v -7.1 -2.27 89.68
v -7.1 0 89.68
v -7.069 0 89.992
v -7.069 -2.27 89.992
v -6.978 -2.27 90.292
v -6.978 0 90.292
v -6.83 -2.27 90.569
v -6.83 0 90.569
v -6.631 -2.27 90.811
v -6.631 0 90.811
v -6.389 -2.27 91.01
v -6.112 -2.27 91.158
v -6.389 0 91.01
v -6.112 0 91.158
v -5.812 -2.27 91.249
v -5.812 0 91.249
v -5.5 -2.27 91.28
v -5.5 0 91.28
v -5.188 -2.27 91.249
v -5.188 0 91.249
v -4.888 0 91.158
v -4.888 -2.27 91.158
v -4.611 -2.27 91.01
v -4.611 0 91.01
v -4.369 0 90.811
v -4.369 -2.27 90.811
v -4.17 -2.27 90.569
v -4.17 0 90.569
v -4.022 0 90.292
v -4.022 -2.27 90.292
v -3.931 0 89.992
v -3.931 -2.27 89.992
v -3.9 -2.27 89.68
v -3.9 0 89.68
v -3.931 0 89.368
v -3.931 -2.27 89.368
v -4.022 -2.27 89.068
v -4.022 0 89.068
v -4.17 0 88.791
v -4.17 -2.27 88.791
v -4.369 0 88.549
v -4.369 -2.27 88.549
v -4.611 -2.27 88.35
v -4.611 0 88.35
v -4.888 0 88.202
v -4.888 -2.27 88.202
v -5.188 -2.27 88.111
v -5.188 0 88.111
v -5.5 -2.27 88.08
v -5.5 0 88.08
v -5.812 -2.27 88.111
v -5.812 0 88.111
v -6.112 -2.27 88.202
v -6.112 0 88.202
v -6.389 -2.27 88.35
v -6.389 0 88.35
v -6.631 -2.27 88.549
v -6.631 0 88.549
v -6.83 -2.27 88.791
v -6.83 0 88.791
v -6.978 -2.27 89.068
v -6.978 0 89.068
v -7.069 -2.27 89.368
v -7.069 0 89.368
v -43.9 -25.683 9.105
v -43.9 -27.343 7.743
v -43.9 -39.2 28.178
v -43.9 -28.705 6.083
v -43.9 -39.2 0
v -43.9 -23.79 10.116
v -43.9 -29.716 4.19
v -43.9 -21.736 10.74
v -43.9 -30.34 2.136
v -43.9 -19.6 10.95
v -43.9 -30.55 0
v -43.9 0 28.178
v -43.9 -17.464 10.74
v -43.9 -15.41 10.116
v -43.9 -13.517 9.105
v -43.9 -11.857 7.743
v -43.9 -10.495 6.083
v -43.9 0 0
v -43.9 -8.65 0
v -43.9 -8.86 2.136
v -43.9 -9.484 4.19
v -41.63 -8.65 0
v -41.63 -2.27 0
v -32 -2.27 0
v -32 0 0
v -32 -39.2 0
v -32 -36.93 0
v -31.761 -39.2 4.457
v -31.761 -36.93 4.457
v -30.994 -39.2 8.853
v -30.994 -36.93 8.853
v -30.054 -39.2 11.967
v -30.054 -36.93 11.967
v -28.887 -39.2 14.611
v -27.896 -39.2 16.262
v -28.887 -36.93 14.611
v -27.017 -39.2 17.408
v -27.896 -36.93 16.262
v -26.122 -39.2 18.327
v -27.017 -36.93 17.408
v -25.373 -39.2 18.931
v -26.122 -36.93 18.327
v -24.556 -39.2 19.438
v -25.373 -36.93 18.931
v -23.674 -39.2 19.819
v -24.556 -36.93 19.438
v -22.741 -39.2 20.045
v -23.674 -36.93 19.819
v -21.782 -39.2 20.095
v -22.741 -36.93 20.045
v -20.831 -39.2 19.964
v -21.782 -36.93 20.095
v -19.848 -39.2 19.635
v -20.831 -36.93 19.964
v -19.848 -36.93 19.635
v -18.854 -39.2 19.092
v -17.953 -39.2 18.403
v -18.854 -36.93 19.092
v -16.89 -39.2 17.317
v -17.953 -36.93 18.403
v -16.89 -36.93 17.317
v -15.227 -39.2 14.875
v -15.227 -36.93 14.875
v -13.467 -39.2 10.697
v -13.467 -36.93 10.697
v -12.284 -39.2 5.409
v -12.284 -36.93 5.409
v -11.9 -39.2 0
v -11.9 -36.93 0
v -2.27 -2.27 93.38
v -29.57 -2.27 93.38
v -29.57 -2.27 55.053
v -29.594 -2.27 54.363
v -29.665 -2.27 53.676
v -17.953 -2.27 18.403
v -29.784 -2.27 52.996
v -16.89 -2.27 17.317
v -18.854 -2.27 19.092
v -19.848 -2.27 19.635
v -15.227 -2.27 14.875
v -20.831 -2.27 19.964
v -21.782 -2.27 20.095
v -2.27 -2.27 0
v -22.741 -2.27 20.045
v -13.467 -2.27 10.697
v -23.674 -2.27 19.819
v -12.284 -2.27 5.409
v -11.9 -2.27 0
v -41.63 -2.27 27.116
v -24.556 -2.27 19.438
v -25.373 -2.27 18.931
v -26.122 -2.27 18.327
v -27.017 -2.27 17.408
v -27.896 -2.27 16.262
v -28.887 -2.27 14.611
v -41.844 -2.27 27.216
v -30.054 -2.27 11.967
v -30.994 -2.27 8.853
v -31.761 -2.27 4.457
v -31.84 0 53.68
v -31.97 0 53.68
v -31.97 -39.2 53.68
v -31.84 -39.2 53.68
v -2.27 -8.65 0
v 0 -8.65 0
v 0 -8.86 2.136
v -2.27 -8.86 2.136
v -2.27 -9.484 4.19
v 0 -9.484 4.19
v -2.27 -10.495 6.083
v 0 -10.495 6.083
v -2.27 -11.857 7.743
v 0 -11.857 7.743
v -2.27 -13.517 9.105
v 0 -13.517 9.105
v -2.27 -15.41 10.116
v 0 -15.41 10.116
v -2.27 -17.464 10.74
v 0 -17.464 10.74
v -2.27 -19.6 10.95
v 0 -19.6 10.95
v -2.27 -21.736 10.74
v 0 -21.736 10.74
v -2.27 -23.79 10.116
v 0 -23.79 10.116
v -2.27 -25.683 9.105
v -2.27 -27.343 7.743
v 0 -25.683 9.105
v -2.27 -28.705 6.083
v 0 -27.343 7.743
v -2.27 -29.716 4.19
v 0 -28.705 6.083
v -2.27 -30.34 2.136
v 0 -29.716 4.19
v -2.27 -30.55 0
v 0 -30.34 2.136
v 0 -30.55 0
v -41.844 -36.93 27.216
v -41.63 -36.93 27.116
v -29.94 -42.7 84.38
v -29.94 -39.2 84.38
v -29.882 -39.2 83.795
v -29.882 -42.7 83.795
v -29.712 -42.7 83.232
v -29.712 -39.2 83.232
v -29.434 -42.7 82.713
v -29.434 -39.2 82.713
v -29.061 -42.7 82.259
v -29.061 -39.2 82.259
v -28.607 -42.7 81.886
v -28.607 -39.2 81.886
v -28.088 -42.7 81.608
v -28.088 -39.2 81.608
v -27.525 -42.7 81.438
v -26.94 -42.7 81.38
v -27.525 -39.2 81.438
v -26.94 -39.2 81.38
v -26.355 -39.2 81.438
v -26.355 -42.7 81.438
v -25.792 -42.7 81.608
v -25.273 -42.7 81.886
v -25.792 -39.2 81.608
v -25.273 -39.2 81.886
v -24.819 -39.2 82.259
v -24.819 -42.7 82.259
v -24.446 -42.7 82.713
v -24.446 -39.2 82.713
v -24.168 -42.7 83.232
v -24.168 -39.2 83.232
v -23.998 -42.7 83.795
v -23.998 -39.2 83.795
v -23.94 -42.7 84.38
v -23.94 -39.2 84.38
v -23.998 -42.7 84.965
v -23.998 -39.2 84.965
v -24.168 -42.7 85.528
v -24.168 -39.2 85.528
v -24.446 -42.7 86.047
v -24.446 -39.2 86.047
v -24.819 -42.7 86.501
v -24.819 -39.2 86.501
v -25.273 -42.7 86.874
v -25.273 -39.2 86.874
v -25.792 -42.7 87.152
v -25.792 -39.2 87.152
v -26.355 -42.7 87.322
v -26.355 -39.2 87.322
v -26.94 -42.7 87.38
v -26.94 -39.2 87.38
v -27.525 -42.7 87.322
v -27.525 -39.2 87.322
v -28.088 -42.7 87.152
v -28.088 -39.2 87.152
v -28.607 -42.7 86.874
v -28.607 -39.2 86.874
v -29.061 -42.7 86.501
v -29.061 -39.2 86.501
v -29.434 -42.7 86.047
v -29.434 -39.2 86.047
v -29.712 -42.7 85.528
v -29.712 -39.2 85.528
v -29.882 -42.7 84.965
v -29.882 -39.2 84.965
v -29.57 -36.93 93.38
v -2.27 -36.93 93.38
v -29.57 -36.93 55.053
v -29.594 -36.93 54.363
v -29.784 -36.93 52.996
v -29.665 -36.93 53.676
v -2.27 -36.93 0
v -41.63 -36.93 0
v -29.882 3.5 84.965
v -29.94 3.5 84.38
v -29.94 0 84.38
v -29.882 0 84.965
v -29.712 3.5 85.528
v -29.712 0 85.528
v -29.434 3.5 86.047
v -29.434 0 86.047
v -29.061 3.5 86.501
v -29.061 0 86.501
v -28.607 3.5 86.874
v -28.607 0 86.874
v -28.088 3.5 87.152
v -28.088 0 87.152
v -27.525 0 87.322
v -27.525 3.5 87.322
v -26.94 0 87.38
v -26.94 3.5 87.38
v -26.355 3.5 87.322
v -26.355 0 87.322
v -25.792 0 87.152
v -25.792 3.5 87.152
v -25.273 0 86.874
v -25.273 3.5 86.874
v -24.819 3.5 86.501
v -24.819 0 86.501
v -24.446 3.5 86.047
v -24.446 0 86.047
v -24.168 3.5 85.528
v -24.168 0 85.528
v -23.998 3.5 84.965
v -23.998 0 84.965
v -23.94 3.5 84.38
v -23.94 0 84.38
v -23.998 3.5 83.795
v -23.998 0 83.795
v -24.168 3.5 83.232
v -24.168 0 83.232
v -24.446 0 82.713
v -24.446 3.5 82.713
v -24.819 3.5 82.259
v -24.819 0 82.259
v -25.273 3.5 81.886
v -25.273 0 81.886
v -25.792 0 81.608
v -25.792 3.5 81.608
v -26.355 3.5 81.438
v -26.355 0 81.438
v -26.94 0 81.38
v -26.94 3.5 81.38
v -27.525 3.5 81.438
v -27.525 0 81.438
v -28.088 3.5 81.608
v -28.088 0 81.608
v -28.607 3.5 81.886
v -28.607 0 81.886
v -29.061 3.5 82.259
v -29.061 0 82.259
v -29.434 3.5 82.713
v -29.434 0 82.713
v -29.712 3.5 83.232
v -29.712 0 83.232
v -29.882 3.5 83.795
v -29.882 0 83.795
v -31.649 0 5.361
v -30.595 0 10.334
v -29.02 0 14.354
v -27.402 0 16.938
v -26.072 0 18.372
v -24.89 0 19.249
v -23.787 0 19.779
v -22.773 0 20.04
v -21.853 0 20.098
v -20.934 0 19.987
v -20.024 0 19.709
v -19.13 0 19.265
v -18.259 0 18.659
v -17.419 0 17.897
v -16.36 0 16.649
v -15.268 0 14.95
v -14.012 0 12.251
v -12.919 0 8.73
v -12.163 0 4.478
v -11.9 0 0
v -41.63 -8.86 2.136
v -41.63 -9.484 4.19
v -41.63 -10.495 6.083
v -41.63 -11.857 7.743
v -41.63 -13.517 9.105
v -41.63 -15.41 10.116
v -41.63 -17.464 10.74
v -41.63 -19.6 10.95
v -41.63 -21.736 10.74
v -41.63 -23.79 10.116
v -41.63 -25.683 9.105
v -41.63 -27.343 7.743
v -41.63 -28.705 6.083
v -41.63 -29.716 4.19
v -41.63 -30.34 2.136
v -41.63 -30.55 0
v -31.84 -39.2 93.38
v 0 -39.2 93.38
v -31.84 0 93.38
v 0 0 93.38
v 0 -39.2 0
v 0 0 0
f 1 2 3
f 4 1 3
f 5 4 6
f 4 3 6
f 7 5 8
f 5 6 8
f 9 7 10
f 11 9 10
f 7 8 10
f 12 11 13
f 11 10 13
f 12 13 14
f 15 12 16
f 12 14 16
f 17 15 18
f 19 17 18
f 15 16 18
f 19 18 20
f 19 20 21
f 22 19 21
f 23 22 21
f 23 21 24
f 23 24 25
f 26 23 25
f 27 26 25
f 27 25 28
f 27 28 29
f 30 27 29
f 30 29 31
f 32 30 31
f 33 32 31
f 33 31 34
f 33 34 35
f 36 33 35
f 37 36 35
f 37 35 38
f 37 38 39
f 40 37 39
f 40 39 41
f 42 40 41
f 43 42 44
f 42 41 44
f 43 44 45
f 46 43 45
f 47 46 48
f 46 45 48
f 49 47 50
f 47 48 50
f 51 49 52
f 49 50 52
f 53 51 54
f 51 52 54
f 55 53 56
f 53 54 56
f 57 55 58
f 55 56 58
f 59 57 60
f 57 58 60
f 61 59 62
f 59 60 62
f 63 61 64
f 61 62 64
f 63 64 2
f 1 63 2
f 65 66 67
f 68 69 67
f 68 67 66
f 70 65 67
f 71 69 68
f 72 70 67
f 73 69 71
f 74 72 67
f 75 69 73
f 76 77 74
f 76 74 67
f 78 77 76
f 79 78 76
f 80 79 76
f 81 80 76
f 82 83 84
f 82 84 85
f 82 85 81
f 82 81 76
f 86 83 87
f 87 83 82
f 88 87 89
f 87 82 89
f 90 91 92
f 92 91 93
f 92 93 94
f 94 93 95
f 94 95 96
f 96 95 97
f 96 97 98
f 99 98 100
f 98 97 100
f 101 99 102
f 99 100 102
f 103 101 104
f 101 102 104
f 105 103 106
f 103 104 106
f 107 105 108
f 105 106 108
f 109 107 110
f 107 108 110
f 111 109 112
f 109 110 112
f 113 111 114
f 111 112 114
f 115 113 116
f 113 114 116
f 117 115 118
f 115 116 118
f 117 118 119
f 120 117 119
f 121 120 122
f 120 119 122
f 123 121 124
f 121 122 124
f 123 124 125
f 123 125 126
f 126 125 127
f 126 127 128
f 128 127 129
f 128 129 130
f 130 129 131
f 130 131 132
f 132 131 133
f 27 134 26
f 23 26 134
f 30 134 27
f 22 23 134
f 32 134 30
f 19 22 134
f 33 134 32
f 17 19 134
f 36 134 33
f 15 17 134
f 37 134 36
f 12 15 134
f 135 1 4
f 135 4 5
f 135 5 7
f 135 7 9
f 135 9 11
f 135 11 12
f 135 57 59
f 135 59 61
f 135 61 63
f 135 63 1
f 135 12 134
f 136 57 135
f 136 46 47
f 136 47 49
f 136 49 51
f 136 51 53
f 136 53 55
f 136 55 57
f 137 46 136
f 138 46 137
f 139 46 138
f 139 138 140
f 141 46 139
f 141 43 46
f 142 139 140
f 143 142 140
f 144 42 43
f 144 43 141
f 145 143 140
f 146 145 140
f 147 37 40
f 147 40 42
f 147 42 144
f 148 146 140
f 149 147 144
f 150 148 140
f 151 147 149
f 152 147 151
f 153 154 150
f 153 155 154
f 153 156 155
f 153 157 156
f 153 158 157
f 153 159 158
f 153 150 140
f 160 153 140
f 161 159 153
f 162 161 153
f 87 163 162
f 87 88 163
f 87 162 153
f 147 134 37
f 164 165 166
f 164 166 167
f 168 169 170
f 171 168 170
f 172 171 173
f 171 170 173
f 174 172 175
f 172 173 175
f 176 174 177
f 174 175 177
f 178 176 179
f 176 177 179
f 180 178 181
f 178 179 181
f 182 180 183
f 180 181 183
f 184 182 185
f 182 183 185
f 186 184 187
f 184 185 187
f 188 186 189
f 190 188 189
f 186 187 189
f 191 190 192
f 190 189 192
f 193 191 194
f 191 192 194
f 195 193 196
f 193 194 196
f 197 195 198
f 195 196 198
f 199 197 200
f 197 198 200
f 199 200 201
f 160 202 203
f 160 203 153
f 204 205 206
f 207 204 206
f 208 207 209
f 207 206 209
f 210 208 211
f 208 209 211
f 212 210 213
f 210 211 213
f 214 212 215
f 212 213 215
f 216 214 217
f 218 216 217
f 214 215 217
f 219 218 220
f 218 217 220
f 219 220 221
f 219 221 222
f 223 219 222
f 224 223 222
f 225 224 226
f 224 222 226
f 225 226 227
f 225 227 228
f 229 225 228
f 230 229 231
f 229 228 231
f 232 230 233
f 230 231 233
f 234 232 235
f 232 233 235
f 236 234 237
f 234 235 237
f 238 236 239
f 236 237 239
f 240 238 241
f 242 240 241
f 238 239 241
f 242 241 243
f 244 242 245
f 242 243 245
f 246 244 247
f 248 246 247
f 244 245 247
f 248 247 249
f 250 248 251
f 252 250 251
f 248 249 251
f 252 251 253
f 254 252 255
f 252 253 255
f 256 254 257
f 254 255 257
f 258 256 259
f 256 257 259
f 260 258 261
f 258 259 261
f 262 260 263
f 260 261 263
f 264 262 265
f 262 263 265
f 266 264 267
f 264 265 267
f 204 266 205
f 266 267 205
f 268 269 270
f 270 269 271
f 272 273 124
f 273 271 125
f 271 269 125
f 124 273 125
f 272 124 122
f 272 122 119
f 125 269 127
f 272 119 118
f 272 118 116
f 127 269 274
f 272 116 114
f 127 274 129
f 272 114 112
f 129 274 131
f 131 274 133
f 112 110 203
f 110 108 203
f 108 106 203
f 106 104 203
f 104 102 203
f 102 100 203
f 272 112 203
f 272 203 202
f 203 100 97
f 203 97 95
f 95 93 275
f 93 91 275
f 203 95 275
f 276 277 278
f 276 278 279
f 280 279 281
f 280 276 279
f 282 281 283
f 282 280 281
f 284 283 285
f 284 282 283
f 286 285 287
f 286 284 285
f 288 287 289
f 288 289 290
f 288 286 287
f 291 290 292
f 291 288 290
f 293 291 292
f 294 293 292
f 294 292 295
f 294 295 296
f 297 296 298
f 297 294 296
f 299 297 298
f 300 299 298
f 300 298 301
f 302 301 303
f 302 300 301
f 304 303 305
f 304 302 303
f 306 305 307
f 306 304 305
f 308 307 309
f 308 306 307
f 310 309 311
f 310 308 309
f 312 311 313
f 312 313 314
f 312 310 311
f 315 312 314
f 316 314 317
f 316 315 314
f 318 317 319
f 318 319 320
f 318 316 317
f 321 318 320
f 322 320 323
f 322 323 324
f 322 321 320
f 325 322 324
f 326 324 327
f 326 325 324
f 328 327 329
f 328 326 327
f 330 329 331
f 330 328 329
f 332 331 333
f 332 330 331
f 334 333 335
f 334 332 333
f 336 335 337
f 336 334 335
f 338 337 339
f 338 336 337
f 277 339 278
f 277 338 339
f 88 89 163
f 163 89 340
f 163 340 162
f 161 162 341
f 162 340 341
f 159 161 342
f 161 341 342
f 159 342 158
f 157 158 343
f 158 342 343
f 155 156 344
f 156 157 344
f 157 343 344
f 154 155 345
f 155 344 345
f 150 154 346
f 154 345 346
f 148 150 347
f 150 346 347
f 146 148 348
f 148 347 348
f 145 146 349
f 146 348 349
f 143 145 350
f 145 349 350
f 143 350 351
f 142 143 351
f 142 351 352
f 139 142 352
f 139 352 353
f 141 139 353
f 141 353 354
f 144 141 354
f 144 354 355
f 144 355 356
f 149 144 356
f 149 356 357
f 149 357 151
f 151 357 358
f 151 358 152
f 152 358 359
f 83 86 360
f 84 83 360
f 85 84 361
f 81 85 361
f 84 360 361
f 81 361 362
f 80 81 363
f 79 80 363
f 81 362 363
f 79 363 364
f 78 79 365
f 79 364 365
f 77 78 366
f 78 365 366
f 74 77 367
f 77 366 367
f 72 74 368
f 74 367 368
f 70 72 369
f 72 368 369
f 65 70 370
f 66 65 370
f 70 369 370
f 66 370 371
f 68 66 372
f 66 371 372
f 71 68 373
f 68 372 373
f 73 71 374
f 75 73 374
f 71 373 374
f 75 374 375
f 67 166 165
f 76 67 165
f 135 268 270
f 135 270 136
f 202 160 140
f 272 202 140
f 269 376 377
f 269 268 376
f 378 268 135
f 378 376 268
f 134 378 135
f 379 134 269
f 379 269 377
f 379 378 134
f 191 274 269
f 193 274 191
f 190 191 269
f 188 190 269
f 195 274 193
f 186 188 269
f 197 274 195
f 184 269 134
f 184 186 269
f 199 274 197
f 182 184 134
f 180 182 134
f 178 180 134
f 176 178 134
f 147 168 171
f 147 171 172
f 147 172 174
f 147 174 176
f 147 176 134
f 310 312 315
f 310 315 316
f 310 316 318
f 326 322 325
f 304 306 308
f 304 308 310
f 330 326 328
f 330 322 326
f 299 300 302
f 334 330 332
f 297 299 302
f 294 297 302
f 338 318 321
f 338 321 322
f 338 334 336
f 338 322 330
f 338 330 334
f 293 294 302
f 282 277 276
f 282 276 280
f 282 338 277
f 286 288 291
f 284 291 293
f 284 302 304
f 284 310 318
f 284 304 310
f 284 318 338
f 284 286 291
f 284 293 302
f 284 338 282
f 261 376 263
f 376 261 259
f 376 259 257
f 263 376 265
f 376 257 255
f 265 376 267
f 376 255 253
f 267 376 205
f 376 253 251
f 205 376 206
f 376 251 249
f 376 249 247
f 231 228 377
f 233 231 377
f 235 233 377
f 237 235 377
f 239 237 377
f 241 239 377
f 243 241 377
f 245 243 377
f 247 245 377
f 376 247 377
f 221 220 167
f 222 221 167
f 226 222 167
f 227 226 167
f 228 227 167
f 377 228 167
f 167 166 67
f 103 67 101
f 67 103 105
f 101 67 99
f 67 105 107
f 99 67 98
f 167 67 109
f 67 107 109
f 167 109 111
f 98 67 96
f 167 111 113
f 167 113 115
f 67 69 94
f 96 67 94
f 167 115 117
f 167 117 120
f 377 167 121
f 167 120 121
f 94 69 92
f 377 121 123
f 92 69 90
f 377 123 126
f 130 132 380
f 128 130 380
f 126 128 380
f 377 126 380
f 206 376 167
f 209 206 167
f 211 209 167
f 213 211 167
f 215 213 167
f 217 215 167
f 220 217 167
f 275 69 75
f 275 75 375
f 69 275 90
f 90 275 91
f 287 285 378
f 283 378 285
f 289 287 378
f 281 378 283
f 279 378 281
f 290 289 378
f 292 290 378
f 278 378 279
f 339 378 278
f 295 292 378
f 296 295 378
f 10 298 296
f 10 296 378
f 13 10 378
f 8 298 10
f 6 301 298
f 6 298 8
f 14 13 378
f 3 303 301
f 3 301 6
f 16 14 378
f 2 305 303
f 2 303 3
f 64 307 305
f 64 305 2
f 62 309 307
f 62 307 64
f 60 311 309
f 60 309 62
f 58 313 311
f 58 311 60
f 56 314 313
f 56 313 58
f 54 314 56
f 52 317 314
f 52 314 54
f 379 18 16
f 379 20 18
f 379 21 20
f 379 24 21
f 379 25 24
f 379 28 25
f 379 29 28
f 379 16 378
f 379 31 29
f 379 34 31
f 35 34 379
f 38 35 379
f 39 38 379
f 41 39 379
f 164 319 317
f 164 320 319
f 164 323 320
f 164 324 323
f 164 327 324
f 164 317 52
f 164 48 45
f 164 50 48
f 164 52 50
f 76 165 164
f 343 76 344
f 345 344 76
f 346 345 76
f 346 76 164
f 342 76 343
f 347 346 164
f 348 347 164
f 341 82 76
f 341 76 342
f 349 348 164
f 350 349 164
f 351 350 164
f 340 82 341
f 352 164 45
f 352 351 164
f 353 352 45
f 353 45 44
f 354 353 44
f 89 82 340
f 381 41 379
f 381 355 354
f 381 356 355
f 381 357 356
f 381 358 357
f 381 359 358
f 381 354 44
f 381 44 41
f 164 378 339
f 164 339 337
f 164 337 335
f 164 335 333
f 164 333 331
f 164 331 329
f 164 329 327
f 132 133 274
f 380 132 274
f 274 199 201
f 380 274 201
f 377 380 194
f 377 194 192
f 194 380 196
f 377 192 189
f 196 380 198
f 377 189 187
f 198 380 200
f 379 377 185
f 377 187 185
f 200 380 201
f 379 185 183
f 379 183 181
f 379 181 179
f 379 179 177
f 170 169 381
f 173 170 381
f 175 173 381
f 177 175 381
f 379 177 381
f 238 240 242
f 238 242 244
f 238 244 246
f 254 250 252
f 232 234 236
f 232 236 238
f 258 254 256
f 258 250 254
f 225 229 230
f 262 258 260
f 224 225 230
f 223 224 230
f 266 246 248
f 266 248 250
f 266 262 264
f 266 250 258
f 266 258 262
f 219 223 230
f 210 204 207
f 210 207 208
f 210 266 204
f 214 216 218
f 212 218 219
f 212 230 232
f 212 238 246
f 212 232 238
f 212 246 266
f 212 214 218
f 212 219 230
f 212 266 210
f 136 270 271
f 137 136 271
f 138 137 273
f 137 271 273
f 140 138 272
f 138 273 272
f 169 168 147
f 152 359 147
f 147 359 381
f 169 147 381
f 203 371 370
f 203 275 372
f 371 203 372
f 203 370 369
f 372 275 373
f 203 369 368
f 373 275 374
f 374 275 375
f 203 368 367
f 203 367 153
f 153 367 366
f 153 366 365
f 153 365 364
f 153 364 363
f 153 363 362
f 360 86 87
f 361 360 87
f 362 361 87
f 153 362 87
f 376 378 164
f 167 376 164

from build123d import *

# Parameters (mm, degrees)
ESQUISSE1_W                 = 43.9
ESQUISSE1_H                 = 39.2
BOSS_EXTRU_1_DEPTH          = 93.38
ESQUISSE2_W                 = 12.06
ESQUISSE2_H                 = 39.7
ENL_V_MAT_EXTRU_1_DEPTH     = 93.38
ENL_V_START                 = -68.408340654
ENL_V_MAT_EXTRU_2_OUTLINE_W = 39.2
ENL_V_MAT_EXTRU_2_OUTLINE_H = 28.154614495
ENL_V_MAT_EXTRU_2_DEPTH     = 16.704392322
ESQUISSE4_W                 = 39.36
ESQUISSE4_H                 = 34.66
ENL_V_MAT_EXTRU_3_DEPTH     = 27.4
ESQUISSE5_W                 = 27.3
ESQUISSE5_H                 = 34.66
ENL_V_MAT_EXTRU_4_DEPTH     = 100
ENL_V_START_2               = -2.27
ESQUISSE6_W                 = 28.461412474
ESQUISSE6_H                 = 34.66
ENL_V_MAT_EXTRU_7_DEPTH     = 20
CONG_2_R                    = 10
ESQUISSE7_R                 = 3
BOSS_EXTRU_2_DEPTH          = 3.5
BOSS_EXTRU_3_START          = 3.5
ESQUISSE8_R                 = 3
BOSS_EXTRU_3_DEPTH          = 3.5
ESQUISSE9_R                 = 1.6
ENL_V_MAT_EXTRU_8_DEPTH     = 3.5
ESQUISSE10_RX               = 20.100105099
ESQUISSE10_RY               = 10.05
ENL_V_MAT_EXTRU_9_DEPTH     = 100
ESQUISSE12_R                = 10.95
ENL_V_MAT_EXTRU_10_DEPTH    = 100


with BuildPart() as part:
    # Esquisse1 → Boss.-Extru.1 (new body)
    with BuildSketch(Plane.XY):
        with Locations((-21.95, -19.6)):
            Rectangle(ESQUISSE1_W, ESQUISSE1_H)
    extrude(amount=BOSS_EXTRU_1_DEPTH)

    # Esquisse2 → Enlèv. mat.-Extru.1 (cut)
    with BuildSketch(Plane(origin=(0, 0, 0), x_dir=(1, 0, 0), z_dir=(0, 1, 0))):
        with Locations((-37.87, -73.53)):
            Rectangle(ESQUISSE2_W, ESQUISSE2_H)
    extrude(amount=-ENL_V_MAT_EXTRU_1_DEPTH, mode=Mode.SUBTRACT)

    # Enlèv. mat.-Extru.2: read off the stored shape, not the designer's step
    # Enlèv. mat.-Extru.2 outline → Enlèv. mat.-Extru.2 (cut)
    with BuildSketch(Plane(origin=(0, 0, 0), x_dir=(0, 1, 0), z_dir=(0.905787793342715, 0, -0.423731605419439)).offset(ENL_V_START)):
        with Locations((-19.6, 20.998682073)):
            Rectangle(ENL_V_MAT_EXTRU_2_OUTLINE_W, ENL_V_MAT_EXTRU_2_OUTLINE_H)
    extrude(amount=ENL_V_MAT_EXTRU_2_DEPTH, mode=Mode.SUBTRACT)

    # Esquisse4 → Enlèv. mat.-Extru.3 (cut)
    with BuildSketch(Plane(origin=(0, 0, 0), x_dir=(-1, 0, 0), z_dir=(0, 0, -1))):
        with Locations((21.95, -19.6)):
            Rectangle(ESQUISSE4_W, ESQUISSE4_H)
    extrude(amount=-ENL_V_MAT_EXTRU_3_DEPTH, mode=Mode.SUBTRACT)

    # Esquisse5 → Enlèv. mat.-Extru.4 (cut)
    with BuildSketch(Plane.XY.offset(93.38)):
        with Locations((-15.92, -19.6)):
            Rectangle(ESQUISSE5_W, ESQUISSE5_H)
    extrude(amount=-ENL_V_MAT_EXTRU_4_DEPTH, mode=Mode.SUBTRACT)

    # Esquisse6 → Enlèv. mat.-Extru.7 (cut)
    with BuildSketch(Plane(origin=(-46.832805267, 0, 21.908597033), x_dir=(0.42373160541943916, 0, 0.9057877933427149), z_dir=(-0.9057877933427149, 0, 0.42373160541943916)).offset(ENL_V_START_2)):
        with Locations((21.152081063, -19.6)):
            Rectangle(ESQUISSE6_W, ESQUISSE6_H)
    extrude(amount=-ENL_V_MAT_EXTRU_7_DEPTH, mode=Mode.SUBTRACT)

    # Congé2
    # the kernel refuses this fillet: 10 mm, written as the material it takes off along each edge
    with BuildSketch(Plane(origin=(-29.57, -36.93, 52.89597765), x_dir=(0, 0, 1), z_dir=(0, 1, 0))) as cong_2_piece_1:
        with BuildLine():
            CenterArc((2.157105836, -10), CONG_2_R, 90, 11.870832878)
            Line((0.10004547, -0.213861709), (0, 0))
            Line((0, 0), (2.157105836, 0))
        make_face()
    extrude(amount=34.66, mode=Mode.SUBTRACT)

    # Esquisse7 → Boss.-Extru.2 (add)
    with BuildSketch(Plane(origin=(0, -39.2, 0), x_dir=(-1, 0, 0), z_dir=(0, -1, 0))):
        with Locations((26.94, -84.38)):
            Circle(ESQUISSE7_R)
    extrude(amount=BOSS_EXTRU_2_DEPTH)

    # Esquisse8 → Boss.-Extru.3 (add)
    with BuildSketch(Plane(origin=(0, 0, 0), x_dir=(1, 0, 0), z_dir=(0, 1, 0)).offset(BOSS_EXTRU_3_START)):
        with Locations(Location((-26.94, -84.38, 0), (0, 0, 180))):
            Circle(ESQUISSE8_R)
    extrude(amount=-BOSS_EXTRU_3_DEPTH)

    # Esquisse9 → Enlèv. mat.-Extru.8 (cut)
    with BuildSketch(Plane(origin=(0, 0, 0), x_dir=(1, 0, 0), z_dir=(0, 1, 0))):
        with Locations(Location((-5.5, -89.68, 0), (0, 0, 180))):
            Circle(ESQUISSE9_R)
    extrude(amount=-ENL_V_MAT_EXTRU_8_DEPTH, mode=Mode.SUBTRACT)

    # Esquisse10 → Enlèv. mat.-Extru.9 (cut)
    with BuildSketch(Plane(origin=(0, 0, 0), x_dir=(1, 0, 0), z_dir=(0, 1, 0))):
        with Locations(Location((-21.95, 0), (0, 0, 89.814715787))):
            Ellipse(ESQUISSE10_RX, ESQUISSE10_RY)
    extrude(amount=-ENL_V_MAT_EXTRU_9_DEPTH, mode=Mode.SUBTRACT)

    # Esquisse12 → Enlèv. mat.-Extru.10 (cut)
    with BuildSketch(Plane(origin=(0, 0, 0), x_dir=(0, 0, -1), z_dir=(1, 0, 0))):
        with Locations((0, -19.6)):
            Circle(ESQUISSE12_R)
    extrude(amount=-ENL_V_MAT_EXTRU_10_DEPTH, mode=Mode.SUBTRACT)


solid = part.part
